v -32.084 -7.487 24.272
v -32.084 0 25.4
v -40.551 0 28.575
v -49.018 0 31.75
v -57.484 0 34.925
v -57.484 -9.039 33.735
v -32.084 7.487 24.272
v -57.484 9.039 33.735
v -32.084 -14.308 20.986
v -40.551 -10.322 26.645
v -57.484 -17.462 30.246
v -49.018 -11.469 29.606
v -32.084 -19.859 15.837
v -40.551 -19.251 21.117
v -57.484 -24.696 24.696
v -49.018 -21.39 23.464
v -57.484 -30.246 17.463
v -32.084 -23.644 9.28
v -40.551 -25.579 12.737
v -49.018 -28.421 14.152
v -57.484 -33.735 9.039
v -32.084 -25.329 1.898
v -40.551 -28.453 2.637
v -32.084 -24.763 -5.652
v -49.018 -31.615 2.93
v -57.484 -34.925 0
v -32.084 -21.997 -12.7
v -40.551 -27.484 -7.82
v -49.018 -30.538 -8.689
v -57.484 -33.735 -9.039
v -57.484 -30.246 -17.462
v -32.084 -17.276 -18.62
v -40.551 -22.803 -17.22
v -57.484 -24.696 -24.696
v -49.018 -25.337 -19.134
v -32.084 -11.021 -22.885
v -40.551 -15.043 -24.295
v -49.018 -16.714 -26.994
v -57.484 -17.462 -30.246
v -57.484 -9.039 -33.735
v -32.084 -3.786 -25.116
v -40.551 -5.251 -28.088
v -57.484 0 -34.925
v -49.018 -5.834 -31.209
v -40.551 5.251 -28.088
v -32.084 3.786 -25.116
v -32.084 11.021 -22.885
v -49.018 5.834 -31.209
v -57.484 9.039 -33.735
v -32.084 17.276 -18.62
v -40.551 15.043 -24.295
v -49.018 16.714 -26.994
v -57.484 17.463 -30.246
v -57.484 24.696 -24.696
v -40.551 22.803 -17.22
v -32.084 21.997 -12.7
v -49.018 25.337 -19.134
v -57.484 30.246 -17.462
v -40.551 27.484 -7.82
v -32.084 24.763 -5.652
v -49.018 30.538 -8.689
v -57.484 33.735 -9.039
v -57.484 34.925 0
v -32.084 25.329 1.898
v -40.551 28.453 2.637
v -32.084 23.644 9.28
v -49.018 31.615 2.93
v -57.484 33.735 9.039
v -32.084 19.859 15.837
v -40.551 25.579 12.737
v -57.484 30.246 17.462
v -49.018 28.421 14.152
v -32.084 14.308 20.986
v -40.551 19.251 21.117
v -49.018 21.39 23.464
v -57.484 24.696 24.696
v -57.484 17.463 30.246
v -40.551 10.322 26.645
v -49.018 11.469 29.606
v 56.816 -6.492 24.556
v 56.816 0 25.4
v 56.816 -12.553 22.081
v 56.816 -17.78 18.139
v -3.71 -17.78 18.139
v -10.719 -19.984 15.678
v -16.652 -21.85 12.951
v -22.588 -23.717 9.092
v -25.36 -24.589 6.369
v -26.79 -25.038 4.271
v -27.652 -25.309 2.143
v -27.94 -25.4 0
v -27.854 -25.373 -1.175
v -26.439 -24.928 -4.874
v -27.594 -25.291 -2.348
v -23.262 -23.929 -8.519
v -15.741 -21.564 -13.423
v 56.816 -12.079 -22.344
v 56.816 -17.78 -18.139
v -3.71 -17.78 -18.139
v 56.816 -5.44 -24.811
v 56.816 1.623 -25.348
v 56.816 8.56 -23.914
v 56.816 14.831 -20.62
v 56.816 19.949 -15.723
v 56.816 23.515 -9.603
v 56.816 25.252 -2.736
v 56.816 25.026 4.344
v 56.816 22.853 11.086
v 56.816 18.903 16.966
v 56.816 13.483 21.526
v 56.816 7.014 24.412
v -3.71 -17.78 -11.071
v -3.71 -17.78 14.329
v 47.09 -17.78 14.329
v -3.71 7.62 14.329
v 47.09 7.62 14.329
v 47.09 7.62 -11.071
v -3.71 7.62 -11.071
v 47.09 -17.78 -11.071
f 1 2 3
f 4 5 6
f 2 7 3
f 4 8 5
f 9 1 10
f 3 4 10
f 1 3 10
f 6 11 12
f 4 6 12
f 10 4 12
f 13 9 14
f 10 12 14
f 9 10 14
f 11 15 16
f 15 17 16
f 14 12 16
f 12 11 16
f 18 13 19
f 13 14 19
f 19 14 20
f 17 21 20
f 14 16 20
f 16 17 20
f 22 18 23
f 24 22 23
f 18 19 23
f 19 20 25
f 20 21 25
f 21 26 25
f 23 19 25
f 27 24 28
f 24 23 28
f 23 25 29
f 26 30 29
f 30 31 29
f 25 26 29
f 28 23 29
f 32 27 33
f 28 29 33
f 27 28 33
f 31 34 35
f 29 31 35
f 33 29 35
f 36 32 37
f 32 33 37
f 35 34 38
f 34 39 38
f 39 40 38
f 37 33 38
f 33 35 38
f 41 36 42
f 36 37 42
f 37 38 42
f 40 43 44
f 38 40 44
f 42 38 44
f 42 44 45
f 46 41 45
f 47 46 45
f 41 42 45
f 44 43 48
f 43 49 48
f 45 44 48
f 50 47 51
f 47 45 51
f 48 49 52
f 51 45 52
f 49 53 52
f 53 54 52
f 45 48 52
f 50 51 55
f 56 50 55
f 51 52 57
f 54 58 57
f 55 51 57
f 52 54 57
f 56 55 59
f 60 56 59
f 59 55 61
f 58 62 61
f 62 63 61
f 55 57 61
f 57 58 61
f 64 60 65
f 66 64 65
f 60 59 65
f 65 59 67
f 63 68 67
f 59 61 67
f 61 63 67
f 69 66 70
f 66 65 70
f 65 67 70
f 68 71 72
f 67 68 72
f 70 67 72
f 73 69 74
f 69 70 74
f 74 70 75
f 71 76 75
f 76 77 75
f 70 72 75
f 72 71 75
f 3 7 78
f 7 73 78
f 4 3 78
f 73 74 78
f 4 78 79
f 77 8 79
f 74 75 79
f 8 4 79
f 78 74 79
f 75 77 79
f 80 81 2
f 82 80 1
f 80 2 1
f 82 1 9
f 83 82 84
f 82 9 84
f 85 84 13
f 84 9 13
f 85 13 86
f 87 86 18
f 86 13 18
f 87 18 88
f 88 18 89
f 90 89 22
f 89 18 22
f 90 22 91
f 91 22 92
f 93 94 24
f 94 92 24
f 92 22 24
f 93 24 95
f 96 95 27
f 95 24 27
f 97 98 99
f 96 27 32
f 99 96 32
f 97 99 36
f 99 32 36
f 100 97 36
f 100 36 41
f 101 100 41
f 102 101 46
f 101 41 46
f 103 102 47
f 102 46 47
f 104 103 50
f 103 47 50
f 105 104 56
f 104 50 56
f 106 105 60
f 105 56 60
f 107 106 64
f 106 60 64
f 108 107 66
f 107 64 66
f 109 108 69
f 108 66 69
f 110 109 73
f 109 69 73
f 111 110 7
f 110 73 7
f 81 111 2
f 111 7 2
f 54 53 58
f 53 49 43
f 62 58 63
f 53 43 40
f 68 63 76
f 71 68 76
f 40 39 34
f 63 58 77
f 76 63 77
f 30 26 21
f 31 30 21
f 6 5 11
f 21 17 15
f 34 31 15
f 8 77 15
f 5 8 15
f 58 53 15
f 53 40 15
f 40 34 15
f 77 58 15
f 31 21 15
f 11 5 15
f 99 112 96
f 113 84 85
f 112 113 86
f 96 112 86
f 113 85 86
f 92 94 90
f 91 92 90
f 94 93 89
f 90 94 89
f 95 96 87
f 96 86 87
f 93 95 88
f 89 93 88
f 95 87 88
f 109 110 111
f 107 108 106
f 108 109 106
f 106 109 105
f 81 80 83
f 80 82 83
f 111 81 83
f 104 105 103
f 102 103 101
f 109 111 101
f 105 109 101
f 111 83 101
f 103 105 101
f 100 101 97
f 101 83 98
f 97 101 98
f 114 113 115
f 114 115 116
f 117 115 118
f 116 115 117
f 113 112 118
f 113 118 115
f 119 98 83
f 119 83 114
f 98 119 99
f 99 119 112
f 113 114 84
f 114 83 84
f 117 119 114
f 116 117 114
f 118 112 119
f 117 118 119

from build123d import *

# Parameters (mm, degrees)
F5_DEPTH = 25.4
F7_W     = 50.8
F7_H     = 25.4
F8_DEPTH = 50.8


with BuildPart() as f2:
    # F0 (on Front) → F2 (revolve)
    with BuildSketch(Plane.XZ):
        Polygon((56.8157893273, 25.4), (0, 25.4), (-32.0842106727, 25.4), (-57.4842106727, 34.925), (-57.4842106727, 0), (56.8157893273, 0), align=None)
    revolve(axis=Axis((-0.3342106727, 0, 0), (1, 0, 0)))

    # F4 (on Top) → F5 (cut, symmetric)
    with BuildSketch(Plane.XY):
        Polygon((-27.94, -30.9217389812), (58.42, -30.9217389812), (58.42, -17.78), (-3.709944284, -17.78), (-27.94, -25.4), align=None)
    extrude(amount=F5_DEPTH, both=True, mode=Mode.SUBTRACT)

    # F7 (on offset) → F8 (cut)
    with BuildSketch(Plane.XZ.offset(43.18)):
        with Locations((21.690055716, 1.6290084645)):
            Rectangle(F7_W, F7_H)
    extrude(amount=-F8_DEPTH, mode=Mode.SUBTRACT)


solid = f2.part
